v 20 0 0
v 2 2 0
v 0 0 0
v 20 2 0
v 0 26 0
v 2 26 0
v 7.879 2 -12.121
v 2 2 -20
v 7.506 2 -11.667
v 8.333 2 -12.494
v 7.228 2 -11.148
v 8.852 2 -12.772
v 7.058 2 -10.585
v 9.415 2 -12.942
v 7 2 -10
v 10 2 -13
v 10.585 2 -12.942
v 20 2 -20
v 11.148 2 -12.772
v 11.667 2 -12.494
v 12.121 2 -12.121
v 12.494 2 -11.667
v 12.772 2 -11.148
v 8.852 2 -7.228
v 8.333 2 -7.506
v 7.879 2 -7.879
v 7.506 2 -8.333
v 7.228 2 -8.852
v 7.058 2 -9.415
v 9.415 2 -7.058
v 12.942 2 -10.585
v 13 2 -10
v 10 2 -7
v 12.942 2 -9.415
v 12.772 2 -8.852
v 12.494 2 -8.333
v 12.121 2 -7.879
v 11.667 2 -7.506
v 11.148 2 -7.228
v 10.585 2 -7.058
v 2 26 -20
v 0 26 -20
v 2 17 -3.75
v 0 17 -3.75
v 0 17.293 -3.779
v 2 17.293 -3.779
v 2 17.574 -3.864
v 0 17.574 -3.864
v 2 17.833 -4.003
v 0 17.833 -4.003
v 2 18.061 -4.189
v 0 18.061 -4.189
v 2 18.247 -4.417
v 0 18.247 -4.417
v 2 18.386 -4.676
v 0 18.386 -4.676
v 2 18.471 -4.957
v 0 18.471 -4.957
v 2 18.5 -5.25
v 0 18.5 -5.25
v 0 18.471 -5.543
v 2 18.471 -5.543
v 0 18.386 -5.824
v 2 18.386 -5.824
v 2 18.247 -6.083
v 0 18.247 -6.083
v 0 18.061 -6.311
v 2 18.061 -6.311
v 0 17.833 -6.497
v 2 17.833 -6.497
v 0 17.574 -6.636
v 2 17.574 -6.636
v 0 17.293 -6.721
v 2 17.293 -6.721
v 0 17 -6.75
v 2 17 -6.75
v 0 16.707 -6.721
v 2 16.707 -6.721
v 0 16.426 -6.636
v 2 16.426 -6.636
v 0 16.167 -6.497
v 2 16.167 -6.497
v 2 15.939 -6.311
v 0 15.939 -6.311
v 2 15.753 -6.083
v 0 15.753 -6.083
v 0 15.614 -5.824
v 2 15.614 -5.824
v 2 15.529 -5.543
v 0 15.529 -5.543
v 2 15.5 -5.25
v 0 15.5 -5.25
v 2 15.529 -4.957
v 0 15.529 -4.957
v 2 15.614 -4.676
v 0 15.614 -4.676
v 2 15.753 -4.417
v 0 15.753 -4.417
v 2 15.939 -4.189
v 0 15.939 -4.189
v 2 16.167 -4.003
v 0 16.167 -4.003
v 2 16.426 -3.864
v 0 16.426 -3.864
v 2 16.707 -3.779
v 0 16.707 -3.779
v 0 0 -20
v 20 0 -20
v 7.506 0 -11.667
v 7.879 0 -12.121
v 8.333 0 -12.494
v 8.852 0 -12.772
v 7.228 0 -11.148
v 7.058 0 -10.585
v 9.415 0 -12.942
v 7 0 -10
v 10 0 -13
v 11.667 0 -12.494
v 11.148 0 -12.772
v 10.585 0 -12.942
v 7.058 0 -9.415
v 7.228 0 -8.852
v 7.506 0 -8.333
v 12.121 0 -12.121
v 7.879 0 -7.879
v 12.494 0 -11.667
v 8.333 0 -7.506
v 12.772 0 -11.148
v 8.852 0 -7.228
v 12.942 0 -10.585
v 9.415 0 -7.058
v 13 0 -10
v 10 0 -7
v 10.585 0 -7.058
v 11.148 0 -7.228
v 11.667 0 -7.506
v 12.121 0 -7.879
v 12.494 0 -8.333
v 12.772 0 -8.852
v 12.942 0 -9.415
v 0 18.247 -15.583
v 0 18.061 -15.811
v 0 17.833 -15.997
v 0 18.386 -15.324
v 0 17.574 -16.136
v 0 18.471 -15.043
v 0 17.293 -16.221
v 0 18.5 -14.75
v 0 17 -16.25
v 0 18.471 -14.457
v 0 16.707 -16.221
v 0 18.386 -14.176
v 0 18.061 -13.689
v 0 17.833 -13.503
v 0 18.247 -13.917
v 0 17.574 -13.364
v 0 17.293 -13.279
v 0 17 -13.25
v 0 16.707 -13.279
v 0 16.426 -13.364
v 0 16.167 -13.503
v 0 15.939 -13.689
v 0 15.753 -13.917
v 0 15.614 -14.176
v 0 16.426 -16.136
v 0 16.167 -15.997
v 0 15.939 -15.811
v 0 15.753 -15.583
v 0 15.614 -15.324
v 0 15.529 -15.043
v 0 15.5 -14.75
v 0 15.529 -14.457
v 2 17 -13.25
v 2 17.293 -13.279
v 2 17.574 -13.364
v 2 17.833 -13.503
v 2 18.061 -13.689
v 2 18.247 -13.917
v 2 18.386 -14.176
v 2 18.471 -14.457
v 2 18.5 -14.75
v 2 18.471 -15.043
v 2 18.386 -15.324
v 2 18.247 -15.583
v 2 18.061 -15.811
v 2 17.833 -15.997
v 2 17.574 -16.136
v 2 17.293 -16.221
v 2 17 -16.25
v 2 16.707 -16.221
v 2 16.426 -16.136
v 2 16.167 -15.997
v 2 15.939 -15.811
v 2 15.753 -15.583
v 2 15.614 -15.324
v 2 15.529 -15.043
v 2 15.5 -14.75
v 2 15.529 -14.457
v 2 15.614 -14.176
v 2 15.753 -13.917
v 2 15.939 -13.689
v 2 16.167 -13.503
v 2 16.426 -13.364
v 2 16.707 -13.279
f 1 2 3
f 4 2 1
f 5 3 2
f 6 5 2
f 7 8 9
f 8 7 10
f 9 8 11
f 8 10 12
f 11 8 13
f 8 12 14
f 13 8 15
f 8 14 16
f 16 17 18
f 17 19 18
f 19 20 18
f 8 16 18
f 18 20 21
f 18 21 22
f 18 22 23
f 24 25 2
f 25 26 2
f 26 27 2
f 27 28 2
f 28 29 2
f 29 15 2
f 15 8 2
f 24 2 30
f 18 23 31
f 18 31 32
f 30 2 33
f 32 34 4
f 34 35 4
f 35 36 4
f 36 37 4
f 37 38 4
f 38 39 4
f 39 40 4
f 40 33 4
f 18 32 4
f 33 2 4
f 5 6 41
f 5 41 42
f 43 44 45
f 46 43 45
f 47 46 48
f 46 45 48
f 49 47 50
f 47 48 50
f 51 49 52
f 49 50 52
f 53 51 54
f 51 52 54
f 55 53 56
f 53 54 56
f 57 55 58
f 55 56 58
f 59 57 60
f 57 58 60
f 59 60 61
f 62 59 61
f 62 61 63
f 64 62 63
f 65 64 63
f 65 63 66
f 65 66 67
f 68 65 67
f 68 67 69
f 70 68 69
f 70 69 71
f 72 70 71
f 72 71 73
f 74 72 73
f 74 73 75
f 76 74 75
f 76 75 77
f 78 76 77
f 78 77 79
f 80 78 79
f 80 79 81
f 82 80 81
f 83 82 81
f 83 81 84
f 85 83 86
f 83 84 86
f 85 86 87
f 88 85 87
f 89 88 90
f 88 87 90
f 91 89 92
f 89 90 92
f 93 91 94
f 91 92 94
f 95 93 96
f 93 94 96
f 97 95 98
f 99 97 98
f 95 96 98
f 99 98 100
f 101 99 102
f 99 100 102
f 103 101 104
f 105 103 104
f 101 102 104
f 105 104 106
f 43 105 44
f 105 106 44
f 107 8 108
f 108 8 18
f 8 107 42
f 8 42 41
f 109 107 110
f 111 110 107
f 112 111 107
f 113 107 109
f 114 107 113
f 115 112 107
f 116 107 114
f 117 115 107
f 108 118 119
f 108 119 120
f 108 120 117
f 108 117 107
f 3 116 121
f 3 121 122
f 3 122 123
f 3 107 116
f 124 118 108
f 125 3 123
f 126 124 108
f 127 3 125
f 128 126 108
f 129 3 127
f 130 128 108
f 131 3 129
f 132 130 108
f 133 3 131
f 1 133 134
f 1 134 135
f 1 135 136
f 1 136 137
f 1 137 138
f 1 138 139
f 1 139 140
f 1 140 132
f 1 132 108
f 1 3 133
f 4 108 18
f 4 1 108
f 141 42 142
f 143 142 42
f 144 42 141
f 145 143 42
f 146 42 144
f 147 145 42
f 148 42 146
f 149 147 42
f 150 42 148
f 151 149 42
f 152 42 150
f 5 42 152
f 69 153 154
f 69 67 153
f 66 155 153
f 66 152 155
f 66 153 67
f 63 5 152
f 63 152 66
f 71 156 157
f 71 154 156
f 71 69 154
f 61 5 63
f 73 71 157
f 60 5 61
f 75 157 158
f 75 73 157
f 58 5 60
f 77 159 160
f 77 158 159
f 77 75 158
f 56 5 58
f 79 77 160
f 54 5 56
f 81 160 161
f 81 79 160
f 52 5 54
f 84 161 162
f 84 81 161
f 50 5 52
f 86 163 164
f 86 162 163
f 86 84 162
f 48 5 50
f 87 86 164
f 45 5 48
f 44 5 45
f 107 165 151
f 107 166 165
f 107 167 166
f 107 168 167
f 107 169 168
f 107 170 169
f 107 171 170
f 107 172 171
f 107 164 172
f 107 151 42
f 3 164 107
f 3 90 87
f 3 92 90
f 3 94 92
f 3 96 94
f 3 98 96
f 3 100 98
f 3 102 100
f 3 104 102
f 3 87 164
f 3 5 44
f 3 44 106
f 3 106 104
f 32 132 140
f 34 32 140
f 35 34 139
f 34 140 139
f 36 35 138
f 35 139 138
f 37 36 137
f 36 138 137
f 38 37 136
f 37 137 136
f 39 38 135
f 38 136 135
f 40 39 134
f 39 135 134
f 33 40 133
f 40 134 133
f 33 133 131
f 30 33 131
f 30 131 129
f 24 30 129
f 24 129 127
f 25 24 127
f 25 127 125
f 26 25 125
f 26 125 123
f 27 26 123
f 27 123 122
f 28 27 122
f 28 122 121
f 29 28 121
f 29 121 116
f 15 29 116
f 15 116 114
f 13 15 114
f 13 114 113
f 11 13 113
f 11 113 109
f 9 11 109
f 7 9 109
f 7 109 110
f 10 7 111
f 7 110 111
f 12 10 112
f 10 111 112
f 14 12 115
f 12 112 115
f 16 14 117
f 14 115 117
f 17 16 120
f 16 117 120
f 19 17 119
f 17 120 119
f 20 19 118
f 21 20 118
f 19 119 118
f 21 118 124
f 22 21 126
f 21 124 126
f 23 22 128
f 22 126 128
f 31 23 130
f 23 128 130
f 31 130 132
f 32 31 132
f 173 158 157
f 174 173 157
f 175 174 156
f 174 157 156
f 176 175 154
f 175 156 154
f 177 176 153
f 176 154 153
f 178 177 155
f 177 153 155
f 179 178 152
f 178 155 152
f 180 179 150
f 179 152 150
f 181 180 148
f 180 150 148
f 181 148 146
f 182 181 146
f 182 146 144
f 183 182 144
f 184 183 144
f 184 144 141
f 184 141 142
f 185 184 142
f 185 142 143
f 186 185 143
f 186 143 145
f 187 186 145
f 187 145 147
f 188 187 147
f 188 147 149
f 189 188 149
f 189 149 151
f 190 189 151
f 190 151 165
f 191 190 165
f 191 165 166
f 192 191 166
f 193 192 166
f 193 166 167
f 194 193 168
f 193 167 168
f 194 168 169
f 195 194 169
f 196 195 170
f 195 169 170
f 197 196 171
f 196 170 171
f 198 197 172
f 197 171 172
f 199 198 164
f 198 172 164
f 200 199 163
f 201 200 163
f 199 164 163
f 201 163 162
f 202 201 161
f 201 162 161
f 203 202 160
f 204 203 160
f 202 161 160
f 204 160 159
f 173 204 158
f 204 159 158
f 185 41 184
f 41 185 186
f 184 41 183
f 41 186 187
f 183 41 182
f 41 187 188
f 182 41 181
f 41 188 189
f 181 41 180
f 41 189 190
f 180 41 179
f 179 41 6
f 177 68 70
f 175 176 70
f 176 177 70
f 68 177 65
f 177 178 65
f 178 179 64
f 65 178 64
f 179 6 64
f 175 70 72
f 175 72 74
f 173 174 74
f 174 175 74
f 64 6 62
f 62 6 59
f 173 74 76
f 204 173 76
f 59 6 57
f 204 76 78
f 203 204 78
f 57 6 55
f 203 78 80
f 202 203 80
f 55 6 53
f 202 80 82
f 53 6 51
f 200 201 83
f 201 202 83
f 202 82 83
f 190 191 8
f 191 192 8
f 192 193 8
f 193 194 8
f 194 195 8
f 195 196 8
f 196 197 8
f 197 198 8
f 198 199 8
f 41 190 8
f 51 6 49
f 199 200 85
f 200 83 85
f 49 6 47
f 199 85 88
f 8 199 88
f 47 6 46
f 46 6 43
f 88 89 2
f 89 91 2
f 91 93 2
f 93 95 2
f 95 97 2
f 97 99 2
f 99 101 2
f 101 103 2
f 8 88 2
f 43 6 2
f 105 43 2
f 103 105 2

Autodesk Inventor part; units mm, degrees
ref_plane "YZ Plane" through (0, 0, 0) normal (1, 0, 0) x (0, 1, 0)
ref_plane "XZ Plane" through (0, 0, 0) normal (0, 1, 0) x (-1, 0, 0)
ref_plane "XY Plane" through (0, 0, 0) normal (0, 0, 1) x (1, 0, 0)
sketch "Sketch9" plane through (0, 0, 0) normal (0, 0, 1) x (1, 0, 0)
  line L0 (0, 0) -> (20, 0)
  line L1 (20, 0) -> (20, 26)
  line L2 (2, 26) -> (0, 26)
  line L3 (0, 26) -> (0, 0)
  line L4 (2, 26) -> (2, 2)
  line L5 (2, 2) -> (20, 2)
  line L6 (20, 2) -> (20, 26)
  dimension "d35" = 20
  dimension "d36" = 26
  dimension "d37" = 2
  dimension "d38" = 2
extrude "Extrusion9" add sketch "Sketch9" against normal blind 20
sketch "Sketch10" plane through (0, 0, 0) normal (0, -1, 0) x (1, 0, 0)
  line L0 (0, 0) -> (20, 0) projected
  line L1 (10, 0) -> (10, -20)
  line L2 (20, -20) -> (0, -20) projected
  circle A0 centre (10, -10) radius 3
  dimension "d41" = 6
extrude "Extrusion10" cut sketch "Sketch10" against normal through all
sketch "Sketch11" plane through (0, 0, 0) normal (-1, 0, 0) x (0, 0, 1)
  line L0 (0, 26) -> (0, 0) projected
  line L1 (0, 26) -> (0, 17)
  circle A0 centre (-5.25, 17) radius 1.5
  circle A1 centre (-14.75, 17) radius 1.5
  dimension "d44" = 9
  dimension "d45" = 3
  dimension "d46" = 3
  dimension "d47" = 9.5
  dimension "d48" = 5.25
extrude "Extrusion11" cut sketch "Sketch11" against normal through all
properties part number "LimitSwitch MountV2"
